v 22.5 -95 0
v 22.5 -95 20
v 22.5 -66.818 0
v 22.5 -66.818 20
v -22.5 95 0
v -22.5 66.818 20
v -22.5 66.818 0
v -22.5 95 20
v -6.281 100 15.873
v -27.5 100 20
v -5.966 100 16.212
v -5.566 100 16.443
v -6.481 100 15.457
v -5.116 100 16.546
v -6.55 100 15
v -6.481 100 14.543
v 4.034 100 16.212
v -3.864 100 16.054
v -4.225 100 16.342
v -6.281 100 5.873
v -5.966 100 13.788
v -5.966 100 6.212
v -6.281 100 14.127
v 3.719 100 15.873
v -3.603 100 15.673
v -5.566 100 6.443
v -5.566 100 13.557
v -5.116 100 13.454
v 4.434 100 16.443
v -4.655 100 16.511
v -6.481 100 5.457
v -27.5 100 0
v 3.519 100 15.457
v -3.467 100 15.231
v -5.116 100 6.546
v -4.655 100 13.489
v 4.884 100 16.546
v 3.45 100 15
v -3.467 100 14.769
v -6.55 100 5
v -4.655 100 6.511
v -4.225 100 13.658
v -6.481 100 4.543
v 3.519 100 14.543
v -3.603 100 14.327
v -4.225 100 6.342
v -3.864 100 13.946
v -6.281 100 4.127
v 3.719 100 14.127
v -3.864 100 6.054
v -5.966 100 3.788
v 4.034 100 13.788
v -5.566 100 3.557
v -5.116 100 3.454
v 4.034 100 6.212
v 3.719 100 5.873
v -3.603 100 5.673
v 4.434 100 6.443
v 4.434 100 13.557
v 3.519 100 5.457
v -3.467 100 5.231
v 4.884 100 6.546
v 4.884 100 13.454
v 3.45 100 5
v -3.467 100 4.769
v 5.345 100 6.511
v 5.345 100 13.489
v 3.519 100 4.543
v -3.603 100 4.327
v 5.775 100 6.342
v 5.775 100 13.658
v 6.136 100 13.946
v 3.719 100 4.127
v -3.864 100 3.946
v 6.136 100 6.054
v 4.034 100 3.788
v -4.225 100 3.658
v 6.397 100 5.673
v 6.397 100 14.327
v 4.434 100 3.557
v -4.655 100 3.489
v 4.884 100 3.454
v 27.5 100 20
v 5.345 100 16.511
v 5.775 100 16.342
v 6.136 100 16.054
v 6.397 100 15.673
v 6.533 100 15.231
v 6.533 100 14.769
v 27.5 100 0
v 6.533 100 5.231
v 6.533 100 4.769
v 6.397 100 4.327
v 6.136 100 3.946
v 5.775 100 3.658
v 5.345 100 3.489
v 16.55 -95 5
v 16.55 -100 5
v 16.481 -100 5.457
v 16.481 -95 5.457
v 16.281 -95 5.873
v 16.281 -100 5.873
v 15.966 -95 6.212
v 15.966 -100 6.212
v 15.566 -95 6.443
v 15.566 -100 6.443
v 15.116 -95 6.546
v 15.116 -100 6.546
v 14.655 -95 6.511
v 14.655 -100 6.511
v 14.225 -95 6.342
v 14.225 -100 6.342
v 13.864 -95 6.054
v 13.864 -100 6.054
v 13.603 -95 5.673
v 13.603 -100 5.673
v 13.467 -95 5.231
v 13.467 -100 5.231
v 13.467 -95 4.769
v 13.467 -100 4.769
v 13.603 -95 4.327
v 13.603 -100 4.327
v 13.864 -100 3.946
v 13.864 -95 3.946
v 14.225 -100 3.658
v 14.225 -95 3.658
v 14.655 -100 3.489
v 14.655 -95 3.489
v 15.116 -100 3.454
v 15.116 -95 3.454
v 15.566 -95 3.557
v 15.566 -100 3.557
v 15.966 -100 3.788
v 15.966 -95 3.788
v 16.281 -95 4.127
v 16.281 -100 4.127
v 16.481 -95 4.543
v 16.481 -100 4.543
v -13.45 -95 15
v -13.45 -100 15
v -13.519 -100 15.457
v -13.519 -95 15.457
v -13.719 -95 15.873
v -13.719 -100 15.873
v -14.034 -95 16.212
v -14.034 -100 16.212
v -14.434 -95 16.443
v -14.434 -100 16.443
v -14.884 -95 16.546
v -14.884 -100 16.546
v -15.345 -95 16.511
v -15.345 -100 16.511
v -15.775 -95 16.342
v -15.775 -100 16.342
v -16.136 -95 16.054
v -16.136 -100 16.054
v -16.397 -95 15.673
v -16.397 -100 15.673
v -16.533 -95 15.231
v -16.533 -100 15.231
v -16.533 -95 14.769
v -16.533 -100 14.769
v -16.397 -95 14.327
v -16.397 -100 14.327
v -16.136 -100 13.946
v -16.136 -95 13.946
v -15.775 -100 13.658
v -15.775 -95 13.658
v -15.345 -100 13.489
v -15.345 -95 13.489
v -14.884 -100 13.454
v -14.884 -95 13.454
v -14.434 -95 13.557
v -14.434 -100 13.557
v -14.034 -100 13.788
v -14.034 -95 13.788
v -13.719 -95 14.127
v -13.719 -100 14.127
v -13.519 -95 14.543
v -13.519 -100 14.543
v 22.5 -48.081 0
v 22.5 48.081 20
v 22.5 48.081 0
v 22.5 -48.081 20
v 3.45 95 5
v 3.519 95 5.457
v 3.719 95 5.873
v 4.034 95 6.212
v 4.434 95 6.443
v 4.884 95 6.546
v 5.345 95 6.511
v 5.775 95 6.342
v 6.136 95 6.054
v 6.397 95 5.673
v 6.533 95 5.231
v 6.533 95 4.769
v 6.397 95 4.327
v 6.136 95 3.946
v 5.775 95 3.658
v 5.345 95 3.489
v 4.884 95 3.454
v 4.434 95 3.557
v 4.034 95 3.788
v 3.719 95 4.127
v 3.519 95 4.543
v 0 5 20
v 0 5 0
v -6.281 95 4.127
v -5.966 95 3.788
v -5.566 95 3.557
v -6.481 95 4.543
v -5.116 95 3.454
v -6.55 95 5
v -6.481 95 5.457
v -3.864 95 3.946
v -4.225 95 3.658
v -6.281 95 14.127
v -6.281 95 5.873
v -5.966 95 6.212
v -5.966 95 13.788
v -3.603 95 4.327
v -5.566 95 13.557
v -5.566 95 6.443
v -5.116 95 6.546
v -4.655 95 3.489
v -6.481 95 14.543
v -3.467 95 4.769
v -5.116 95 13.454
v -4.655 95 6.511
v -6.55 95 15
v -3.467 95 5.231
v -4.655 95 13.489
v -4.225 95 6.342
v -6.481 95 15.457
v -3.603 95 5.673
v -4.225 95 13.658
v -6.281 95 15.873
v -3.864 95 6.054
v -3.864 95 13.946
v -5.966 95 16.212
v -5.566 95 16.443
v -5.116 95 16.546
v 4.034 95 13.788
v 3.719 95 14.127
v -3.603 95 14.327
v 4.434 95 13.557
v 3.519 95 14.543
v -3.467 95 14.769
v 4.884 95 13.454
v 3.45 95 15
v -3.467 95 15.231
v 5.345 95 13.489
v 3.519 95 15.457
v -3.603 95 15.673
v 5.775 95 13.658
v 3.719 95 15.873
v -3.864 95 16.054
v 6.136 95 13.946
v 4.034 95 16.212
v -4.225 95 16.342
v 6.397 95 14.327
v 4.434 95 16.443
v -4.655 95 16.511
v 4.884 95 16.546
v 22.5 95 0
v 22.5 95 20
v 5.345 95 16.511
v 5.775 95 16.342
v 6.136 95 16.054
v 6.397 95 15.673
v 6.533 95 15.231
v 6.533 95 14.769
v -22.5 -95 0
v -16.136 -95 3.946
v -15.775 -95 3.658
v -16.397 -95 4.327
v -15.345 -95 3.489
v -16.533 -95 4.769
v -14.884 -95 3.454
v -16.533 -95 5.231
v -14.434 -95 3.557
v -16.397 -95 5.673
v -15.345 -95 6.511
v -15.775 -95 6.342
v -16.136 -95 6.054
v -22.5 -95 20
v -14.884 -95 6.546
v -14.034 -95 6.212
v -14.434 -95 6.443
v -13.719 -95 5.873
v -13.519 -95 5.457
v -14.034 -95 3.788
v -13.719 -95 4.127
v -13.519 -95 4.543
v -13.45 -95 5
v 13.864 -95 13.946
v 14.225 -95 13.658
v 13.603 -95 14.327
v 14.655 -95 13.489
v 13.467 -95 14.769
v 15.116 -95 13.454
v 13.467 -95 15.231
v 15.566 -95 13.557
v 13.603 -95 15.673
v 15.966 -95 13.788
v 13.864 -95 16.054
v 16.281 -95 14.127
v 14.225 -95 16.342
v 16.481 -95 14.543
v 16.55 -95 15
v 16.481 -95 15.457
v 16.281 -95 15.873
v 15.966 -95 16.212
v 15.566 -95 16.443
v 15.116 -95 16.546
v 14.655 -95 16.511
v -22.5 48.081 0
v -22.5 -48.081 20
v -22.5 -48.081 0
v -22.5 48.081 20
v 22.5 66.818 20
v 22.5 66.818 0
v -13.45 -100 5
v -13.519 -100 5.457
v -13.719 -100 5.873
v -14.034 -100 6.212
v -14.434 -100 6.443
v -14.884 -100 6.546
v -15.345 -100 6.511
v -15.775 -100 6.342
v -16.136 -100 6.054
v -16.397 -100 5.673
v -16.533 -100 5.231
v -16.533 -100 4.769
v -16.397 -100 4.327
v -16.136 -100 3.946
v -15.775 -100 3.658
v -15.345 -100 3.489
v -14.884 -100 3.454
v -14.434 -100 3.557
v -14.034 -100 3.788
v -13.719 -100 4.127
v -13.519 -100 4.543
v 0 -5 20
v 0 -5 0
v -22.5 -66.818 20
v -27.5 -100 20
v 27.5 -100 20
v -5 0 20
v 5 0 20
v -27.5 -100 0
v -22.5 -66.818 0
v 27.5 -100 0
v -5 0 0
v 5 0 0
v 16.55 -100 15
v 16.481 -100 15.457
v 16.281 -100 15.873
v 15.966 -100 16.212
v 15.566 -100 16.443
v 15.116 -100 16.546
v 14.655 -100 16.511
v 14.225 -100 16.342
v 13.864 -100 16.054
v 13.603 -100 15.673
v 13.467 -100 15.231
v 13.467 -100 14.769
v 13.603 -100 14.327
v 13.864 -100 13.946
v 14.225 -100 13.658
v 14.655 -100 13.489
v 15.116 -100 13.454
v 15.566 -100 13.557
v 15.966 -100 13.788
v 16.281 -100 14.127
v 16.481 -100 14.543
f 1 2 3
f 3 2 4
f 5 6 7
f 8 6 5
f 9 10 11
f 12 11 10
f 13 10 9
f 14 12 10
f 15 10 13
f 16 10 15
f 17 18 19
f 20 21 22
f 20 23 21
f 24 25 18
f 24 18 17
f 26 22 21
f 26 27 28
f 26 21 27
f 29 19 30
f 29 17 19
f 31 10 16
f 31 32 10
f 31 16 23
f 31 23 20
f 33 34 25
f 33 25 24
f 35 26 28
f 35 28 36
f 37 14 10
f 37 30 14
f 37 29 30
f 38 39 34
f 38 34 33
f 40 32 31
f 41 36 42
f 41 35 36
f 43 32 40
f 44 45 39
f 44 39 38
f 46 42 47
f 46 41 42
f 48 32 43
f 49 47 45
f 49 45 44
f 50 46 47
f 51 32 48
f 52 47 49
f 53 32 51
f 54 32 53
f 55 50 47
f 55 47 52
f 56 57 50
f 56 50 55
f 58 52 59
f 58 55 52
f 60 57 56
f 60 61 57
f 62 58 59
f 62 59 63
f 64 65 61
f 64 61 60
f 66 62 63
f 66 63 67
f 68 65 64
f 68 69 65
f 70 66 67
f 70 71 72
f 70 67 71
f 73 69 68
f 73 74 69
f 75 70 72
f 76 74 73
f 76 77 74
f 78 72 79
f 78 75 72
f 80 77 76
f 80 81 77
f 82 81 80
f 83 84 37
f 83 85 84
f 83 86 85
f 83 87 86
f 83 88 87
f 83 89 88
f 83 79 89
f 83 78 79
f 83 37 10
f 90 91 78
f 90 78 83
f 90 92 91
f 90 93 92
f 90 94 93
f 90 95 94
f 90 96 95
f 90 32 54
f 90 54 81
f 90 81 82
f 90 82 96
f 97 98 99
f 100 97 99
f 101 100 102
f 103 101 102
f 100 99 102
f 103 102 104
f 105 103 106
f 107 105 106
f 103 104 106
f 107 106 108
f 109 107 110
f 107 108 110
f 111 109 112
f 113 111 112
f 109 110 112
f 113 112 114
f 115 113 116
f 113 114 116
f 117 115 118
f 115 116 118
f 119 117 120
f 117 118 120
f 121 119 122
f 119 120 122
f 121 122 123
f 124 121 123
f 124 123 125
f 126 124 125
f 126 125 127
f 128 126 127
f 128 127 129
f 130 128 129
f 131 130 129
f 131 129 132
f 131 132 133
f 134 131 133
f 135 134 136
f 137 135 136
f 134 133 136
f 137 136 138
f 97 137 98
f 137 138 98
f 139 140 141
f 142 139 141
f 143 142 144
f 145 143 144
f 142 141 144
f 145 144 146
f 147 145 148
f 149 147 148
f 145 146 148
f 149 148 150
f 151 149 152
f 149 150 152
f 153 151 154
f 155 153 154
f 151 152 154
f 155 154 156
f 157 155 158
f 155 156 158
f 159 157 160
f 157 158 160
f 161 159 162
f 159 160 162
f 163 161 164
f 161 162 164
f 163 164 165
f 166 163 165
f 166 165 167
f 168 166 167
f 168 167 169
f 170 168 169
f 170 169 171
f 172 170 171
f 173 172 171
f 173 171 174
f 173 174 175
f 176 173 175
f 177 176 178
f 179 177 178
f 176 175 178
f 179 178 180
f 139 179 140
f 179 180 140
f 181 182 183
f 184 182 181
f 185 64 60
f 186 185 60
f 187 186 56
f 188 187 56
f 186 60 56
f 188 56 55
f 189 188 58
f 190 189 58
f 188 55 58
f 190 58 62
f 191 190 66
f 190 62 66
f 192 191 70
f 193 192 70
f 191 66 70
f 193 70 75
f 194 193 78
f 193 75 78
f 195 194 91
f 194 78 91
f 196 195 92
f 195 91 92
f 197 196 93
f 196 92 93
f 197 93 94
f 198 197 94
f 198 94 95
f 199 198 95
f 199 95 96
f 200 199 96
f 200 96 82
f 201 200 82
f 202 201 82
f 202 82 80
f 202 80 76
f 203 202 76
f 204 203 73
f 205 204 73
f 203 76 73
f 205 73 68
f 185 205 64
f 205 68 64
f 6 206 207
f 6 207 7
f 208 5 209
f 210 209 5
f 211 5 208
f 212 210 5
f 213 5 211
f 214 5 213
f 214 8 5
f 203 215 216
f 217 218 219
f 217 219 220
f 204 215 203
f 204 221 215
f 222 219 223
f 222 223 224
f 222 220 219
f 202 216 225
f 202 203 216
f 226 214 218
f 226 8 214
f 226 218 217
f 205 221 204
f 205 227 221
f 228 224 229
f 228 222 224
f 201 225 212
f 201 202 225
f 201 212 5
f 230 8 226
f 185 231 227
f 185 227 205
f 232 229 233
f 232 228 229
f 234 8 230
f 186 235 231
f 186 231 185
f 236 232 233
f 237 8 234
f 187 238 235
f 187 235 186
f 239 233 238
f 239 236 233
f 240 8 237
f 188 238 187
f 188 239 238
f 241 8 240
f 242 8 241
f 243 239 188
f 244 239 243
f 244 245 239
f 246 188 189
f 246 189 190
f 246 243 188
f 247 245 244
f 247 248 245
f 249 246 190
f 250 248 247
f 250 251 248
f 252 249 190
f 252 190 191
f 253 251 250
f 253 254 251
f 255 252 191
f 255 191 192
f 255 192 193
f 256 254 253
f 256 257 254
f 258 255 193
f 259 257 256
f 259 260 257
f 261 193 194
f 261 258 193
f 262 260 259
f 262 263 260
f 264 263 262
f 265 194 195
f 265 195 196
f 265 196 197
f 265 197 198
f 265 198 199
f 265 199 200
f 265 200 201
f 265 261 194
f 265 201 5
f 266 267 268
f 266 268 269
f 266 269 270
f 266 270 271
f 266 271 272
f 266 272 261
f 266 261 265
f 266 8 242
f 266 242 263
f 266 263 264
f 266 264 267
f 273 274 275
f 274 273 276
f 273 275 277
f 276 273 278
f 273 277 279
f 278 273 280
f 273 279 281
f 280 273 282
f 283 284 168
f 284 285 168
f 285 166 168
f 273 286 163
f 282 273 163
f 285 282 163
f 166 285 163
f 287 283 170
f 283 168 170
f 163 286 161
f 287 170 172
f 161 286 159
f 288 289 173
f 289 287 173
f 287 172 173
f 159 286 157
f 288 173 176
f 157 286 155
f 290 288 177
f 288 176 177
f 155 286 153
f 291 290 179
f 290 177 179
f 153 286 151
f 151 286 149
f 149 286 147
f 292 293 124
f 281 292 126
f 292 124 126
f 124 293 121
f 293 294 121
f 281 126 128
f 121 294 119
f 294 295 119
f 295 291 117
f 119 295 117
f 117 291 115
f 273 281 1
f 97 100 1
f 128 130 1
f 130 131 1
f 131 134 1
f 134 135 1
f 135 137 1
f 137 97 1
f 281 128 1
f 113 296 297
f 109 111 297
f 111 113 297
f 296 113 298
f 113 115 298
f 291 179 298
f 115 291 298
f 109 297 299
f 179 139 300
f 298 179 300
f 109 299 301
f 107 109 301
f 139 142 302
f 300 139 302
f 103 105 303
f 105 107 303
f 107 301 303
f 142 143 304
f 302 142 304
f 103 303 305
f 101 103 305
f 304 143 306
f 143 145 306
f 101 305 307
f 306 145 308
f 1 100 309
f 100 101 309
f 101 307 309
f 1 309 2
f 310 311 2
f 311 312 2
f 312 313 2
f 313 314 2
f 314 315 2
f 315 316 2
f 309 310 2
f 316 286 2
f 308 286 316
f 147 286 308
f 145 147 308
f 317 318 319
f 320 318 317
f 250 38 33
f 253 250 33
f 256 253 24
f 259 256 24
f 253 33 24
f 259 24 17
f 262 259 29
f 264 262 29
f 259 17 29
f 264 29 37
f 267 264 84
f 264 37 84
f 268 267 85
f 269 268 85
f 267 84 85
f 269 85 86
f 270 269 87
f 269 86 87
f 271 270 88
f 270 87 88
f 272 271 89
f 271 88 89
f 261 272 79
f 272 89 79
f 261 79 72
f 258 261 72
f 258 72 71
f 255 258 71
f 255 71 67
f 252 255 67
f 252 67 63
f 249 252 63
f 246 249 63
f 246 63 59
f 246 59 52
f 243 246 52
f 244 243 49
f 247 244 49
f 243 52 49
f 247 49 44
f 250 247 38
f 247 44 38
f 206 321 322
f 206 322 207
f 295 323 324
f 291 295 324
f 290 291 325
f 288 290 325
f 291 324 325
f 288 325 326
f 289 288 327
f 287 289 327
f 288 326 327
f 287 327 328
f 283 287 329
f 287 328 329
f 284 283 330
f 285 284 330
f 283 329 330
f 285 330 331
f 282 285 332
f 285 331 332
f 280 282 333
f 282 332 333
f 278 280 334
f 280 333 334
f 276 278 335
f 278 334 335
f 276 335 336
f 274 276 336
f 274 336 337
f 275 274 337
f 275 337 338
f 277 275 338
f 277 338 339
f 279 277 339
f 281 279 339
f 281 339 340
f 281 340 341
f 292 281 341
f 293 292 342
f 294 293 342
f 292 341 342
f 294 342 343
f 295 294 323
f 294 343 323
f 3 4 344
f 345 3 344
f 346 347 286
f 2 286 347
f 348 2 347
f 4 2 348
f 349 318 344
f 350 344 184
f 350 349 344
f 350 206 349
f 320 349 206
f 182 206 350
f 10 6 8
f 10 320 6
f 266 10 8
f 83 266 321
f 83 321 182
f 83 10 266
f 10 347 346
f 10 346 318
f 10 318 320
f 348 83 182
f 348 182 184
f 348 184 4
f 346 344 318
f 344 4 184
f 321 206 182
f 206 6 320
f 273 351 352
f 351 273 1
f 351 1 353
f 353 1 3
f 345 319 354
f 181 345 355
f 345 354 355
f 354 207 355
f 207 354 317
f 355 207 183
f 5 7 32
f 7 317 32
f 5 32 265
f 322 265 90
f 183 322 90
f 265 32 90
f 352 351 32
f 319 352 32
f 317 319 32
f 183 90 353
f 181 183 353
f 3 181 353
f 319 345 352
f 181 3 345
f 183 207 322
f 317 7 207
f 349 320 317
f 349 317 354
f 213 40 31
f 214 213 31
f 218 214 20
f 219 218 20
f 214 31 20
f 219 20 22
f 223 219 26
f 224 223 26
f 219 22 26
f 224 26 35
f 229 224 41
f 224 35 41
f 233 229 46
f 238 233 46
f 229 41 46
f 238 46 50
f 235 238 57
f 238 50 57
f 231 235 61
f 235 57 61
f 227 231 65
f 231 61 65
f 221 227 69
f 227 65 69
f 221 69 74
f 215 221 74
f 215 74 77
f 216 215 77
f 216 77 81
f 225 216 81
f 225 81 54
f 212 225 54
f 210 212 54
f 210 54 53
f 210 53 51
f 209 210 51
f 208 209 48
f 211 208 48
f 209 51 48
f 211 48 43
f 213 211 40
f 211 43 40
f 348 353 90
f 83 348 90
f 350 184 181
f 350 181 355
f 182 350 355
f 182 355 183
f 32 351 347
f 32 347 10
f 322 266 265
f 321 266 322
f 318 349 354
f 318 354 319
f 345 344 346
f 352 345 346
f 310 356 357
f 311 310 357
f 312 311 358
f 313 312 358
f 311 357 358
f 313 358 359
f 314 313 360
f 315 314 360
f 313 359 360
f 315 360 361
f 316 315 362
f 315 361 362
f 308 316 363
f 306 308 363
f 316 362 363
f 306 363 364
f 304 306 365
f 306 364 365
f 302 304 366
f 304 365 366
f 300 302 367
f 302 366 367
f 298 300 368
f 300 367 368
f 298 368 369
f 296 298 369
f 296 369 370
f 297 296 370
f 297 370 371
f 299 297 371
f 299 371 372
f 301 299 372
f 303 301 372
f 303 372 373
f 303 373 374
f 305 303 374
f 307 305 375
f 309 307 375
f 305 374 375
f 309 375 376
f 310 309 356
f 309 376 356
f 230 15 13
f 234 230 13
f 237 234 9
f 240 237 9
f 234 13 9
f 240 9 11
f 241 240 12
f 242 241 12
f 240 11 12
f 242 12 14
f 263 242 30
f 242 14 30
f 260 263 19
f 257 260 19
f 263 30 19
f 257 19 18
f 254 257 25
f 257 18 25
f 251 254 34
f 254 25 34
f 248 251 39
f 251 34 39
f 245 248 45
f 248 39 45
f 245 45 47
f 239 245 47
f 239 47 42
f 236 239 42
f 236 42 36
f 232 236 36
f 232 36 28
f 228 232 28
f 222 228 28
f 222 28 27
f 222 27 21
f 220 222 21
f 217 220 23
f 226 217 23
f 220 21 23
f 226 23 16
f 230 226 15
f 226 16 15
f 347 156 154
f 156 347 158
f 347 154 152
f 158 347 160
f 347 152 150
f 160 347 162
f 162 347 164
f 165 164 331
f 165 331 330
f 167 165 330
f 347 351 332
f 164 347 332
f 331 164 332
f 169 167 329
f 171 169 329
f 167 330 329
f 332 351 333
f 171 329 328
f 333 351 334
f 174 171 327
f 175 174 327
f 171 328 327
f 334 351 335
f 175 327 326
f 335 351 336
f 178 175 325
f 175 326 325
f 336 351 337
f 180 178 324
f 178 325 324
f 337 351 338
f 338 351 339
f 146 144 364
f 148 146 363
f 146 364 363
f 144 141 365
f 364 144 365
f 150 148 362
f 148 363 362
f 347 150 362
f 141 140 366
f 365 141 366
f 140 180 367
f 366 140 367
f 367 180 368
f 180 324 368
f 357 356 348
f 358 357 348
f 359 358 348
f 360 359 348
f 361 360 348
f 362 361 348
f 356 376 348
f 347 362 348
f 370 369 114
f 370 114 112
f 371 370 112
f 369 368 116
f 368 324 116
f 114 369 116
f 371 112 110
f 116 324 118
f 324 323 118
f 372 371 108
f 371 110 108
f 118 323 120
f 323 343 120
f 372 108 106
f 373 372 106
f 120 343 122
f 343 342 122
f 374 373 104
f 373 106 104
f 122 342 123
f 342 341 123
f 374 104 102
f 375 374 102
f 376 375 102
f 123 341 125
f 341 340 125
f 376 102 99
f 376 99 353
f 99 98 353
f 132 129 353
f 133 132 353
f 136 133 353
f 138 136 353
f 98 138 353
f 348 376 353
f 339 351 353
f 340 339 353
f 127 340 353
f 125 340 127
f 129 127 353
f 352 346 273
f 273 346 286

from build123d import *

# Parameters (mm, degrees)
SKETCH_W        = 55
SKETCH_H        = 200
PAD_DEPTH       = 20
POCKET_DEPTH    = 20
SKETCH002_R     = 1.55
POCKET001_DEPTH = 5
SKETCH003_R     = 1.55
POCKET002_DEPTH = 5


with BuildPart() as part:
    # Sketch → Pad (new body)
    with BuildSketch(Plane.XY):
        Rectangle(SKETCH_W, SKETCH_H)
    extrude(amount=PAD_DEPTH)

    # Sketch001 (on Face6 of Pad) → Pocket (cut)
    with BuildSketch(Plane.XY.offset(20)):
        Polygon((-22.5, -95), (22.5, -95), (22.5, -66.818242), (0, -5), (-22.5, -66.818242), align=None)
        Polygon((-22.5, 95), (22.5, 95), (22.5, 66.818242), (0, 5), (-22.5, 66.818242), align=None)
        Polygon((-5, 0), (-22.5, -48.080855), (-22.5, 48.080855), align=None)
        Polygon((5, 0), (22.5, 48.080855), (22.5, -48.080855), align=None)
    extrude(amount=-POCKET_DEPTH, mode=Mode.SUBTRACT)

    # Sketch002 (on Face3 of Pocket) → Pocket001 (cut)
    with BuildSketch(Plane(origin=(0, 100, 0), x_dir=(-1, 0, 0), z_dir=(0, 1, 0))):
        with Locations((-5, 15)):
            Circle(SKETCH002_R)
        with Locations((5, 15)):
            Circle(SKETCH002_R)
        with Locations((5, 5)):
            Circle(SKETCH002_R)
        with Locations((-5, 5)):
            Circle(SKETCH002_R)
    extrude(amount=-POCKET001_DEPTH, mode=Mode.SUBTRACT)

    # Sketch003 (on Face2 of Pocket001) → Pocket002 (cut)
    with BuildSketch(Plane.XZ.offset(100)):
        with Locations((-15, 15)):
            Circle(SKETCH003_R)
        with Locations((15, 15)):
            Circle(SKETCH003_R)
        with Locations((15, 5)):
            Circle(SKETCH003_R)
        with Locations((-15, 5)):
            Circle(SKETCH003_R)
    extrude(amount=-POCKET002_DEPTH, mode=Mode.SUBTRACT)


solid = part.part
